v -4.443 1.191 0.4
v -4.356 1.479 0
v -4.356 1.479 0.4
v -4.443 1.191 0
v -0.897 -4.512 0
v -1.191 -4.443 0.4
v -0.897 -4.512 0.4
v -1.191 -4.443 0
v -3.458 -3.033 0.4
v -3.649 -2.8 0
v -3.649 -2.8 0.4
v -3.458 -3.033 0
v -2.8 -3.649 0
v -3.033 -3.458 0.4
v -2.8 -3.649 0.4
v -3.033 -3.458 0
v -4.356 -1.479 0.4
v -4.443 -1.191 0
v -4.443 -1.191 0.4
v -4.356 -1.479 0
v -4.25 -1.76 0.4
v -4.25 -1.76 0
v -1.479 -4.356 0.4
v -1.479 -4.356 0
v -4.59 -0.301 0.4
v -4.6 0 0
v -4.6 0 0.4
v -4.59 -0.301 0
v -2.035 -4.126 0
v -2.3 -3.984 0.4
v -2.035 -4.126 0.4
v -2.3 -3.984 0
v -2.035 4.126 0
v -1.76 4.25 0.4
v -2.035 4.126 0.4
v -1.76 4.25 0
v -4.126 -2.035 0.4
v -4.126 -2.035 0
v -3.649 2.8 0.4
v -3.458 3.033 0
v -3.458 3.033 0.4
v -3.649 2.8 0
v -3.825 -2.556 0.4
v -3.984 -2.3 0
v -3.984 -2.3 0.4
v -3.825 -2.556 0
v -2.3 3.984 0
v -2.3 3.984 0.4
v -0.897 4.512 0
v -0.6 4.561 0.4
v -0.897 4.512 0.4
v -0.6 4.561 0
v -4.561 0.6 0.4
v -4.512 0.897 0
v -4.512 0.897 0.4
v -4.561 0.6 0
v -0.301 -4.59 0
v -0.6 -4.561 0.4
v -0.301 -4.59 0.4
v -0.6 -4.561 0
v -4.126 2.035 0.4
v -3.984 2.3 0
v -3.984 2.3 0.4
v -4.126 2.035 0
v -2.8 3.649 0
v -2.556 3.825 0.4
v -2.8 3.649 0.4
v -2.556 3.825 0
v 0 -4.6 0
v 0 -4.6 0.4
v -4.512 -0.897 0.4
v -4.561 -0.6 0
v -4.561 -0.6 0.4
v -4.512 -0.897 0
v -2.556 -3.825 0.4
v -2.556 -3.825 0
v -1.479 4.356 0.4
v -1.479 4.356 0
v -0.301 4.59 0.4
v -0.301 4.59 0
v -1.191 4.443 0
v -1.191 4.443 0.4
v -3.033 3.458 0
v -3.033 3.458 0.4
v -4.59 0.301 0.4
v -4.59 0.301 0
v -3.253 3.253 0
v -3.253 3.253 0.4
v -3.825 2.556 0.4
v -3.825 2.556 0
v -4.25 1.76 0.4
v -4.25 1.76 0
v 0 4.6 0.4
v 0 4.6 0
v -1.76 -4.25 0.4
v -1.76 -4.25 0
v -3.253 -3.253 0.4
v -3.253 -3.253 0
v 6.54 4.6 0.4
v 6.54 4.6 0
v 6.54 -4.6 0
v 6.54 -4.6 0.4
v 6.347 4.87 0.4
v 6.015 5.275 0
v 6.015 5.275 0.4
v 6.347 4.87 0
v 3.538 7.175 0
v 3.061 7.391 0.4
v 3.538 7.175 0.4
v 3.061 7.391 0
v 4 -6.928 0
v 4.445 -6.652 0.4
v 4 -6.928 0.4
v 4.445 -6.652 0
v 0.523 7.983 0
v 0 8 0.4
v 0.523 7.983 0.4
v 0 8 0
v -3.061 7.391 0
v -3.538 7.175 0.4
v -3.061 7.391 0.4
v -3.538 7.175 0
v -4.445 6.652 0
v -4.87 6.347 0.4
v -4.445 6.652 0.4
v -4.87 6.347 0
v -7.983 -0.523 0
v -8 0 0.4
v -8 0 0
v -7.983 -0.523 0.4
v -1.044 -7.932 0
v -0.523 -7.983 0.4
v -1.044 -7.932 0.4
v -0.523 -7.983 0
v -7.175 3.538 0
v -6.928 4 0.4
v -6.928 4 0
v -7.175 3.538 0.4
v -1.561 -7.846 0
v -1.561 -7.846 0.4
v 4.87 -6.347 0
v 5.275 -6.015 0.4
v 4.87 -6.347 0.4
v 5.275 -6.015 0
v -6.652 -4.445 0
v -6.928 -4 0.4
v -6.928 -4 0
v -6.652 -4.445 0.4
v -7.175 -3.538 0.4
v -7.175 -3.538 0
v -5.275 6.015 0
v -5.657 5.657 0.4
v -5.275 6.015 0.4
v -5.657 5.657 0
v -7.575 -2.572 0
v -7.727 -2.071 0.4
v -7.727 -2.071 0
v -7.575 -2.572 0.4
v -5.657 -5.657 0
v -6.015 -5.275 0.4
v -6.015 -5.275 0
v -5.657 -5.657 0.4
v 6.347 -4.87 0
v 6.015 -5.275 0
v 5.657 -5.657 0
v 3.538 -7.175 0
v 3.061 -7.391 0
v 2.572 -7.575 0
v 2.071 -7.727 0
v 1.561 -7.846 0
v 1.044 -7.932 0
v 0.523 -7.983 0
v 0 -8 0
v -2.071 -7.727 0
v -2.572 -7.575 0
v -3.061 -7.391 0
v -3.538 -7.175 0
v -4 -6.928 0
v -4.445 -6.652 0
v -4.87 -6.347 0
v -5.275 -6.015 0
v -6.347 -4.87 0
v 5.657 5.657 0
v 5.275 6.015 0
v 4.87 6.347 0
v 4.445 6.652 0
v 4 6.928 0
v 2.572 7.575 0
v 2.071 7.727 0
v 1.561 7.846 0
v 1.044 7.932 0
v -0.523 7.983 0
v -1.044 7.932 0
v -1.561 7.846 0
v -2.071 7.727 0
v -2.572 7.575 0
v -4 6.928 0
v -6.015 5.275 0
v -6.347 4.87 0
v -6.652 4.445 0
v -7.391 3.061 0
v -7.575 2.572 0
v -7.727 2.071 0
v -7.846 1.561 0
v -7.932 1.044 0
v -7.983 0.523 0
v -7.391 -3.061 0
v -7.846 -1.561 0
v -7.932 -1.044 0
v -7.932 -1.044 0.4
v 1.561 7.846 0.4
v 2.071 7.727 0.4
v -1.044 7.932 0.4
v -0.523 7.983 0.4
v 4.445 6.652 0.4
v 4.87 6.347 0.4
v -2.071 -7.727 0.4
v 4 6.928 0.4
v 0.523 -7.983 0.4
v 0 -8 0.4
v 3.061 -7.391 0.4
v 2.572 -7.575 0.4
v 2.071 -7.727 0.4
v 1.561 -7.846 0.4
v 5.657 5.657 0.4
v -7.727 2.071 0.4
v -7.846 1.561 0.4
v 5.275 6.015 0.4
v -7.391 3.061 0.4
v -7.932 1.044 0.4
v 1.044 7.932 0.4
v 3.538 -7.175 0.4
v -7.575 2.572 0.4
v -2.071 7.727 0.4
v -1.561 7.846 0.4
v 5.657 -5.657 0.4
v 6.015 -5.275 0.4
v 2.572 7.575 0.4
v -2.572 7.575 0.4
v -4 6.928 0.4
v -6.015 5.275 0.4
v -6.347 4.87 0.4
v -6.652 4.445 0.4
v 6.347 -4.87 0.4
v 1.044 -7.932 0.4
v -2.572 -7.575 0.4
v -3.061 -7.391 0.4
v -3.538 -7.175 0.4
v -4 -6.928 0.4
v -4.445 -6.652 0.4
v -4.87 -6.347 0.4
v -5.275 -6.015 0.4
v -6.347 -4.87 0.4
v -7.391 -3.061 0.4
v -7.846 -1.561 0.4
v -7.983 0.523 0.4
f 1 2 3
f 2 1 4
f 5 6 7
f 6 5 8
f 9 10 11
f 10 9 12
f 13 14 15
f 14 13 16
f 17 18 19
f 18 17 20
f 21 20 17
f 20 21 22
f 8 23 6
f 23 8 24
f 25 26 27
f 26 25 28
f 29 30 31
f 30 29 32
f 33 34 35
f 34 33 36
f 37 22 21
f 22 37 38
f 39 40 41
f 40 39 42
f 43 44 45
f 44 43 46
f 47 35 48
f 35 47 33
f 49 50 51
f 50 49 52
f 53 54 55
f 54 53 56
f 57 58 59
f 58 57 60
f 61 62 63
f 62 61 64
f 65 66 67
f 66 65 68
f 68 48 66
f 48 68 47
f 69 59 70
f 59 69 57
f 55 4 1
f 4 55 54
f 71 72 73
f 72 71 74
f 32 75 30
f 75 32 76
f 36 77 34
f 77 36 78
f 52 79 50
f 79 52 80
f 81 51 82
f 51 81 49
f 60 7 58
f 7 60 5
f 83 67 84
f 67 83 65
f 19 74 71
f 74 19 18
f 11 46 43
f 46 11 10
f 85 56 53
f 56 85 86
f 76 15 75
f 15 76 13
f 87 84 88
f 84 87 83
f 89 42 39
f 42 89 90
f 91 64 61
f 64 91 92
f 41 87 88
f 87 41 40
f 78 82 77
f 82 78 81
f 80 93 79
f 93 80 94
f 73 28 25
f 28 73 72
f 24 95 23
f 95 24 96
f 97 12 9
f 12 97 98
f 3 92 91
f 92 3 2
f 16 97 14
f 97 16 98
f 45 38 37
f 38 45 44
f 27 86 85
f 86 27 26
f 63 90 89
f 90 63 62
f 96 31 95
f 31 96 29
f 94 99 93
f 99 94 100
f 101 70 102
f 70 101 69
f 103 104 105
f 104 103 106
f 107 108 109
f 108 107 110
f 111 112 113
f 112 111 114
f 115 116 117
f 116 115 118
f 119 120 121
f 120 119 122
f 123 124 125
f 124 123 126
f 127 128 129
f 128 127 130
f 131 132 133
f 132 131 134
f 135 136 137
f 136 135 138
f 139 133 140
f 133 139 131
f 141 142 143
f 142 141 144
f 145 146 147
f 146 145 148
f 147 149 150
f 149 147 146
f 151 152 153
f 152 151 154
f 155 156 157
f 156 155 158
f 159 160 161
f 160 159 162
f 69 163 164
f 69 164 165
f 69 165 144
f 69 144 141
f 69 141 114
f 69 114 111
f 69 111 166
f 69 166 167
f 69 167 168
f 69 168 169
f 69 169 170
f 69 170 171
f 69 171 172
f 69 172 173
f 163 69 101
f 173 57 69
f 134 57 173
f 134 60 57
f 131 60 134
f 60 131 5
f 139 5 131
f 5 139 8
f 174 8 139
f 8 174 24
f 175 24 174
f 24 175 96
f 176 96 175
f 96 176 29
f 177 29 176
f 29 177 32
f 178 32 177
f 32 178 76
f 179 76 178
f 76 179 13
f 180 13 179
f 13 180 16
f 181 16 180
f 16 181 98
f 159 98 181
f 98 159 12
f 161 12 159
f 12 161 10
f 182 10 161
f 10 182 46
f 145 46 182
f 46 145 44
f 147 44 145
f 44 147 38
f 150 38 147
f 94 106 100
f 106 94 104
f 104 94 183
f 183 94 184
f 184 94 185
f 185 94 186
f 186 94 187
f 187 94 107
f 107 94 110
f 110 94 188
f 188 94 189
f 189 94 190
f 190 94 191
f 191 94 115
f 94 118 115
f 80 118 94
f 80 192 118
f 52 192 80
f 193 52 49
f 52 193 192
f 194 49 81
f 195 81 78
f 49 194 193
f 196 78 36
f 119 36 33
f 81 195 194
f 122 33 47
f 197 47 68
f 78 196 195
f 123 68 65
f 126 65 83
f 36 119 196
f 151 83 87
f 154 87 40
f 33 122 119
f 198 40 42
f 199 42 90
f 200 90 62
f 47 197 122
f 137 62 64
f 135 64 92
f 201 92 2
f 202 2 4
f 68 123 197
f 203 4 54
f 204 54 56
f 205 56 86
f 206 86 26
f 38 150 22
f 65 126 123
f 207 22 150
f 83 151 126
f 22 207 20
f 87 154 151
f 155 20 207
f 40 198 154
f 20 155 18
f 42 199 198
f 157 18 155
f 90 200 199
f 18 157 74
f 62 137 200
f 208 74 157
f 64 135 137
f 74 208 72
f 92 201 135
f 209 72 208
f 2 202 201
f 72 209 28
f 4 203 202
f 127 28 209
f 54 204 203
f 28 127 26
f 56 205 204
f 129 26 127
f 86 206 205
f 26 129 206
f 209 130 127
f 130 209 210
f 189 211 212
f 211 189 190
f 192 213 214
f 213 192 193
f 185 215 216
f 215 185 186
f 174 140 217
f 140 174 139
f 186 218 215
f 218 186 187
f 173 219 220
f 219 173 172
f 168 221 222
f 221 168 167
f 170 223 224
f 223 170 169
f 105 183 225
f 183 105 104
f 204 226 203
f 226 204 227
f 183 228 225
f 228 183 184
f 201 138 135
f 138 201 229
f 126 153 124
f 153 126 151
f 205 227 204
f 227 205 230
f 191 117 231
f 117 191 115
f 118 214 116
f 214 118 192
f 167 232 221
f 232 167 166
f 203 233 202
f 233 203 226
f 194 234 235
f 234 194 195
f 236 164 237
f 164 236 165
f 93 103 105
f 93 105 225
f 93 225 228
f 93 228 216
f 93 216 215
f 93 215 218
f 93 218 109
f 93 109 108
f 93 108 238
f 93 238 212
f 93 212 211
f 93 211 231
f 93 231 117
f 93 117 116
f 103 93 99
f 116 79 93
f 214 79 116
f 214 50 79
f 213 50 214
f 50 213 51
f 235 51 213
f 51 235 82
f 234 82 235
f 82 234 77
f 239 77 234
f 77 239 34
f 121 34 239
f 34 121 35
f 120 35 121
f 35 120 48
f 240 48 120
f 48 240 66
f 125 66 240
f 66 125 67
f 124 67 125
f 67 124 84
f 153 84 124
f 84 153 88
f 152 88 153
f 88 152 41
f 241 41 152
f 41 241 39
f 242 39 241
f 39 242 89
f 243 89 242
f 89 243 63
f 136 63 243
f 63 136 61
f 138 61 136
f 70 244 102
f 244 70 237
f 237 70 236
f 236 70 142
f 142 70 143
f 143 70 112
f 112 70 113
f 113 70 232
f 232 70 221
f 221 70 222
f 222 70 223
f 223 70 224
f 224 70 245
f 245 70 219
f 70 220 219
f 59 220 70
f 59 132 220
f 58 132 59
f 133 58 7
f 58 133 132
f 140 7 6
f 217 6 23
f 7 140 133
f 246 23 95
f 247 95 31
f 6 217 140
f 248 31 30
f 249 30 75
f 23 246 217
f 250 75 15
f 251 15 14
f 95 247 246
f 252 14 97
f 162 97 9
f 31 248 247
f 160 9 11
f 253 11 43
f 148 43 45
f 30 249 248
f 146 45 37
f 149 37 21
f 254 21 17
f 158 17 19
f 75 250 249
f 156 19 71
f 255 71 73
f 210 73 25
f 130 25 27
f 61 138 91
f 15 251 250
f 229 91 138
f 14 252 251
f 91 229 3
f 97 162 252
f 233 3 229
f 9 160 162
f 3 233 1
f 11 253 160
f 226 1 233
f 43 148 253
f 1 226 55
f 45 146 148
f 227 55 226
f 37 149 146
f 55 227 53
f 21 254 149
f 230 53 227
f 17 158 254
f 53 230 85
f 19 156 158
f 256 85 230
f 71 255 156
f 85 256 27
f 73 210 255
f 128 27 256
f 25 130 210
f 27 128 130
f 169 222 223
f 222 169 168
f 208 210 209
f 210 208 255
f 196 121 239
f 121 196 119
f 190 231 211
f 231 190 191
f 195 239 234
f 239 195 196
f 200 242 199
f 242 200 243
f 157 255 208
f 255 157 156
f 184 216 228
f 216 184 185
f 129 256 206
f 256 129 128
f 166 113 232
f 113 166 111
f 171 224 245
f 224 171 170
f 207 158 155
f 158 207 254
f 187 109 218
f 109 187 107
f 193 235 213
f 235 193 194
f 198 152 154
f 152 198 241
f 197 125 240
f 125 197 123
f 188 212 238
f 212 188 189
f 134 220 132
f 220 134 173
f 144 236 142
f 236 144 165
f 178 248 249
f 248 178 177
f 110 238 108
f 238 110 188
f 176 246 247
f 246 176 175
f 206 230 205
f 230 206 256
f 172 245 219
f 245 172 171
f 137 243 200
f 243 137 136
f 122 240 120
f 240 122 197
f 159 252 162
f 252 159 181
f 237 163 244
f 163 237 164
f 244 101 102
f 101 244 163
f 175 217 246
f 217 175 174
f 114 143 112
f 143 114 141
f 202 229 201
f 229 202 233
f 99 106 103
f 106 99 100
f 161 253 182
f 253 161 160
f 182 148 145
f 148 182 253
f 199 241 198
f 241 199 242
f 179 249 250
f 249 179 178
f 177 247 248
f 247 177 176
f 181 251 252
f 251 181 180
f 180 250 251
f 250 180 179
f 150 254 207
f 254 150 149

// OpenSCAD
// file: defs.scad
RealityScale = [1.27, 1.27, 1.27];
ViewScale = [0.0254, 0.0254, 0.0254];
JointVertSpace=30;
LayerUnit=100;
SpacedLayer=LayerUnit+JointVertSpace;
JointR = 400;
ShaftR = 200;
ShaftHole=230;
ShaftTight=205;
HexTight=210;
MagicMult = 50;

// Spine Horizontal
MagicA = MagicMult * 38;
// Spine Verticial
MagicL = MagicMult * 7.8;

// Leg Triangle
MagicG = MagicMult * 36.7; // a
MagicH = MagicMult * 65.7; // c
MagicI = MagicMult * 49;   // b

// Driver Triangle
MagicB = MagicMult * 41.5;
MagicD = MagicMult * 40.1;
MagicE = MagicMult * 55.8;

// Front Strut
MagicC = MagicMult * 39.3;
FsLen = MagicC;

// Back Strut
MagicF = MagicMult * 39.4;
BsLen = MagicF;

// Lower Driver Strut
MagicK = MagicMult * 61.9;

// Upper Driver Strut
MagicJ = MagicMult * 50;

// Cam radius
MagicM = MagicMult * 15;

spineLength = sqrt(pow(MagicA, 2) + pow(MagicL,2));
// main file
include <defs.scad>
RealityScale = 1.27;
RealityVec=[RealityScale, RealityScale, RealityScale]; 
ViewScale=[.02,.02,.02];

module washer(thickness)
{
    difference() {
    cylinder(thickness,r=JointR,$fn=96); 
    union() {
    translate([0, 0, -1]) cylinder(thickness+2,r=ShaftHole,$fn=96); 
    translate([0, -ShaftHole, -1]) cube(ShaftHole*2);
    }
    }
}

scale(ViewScale)
{
    washer(20);
}
